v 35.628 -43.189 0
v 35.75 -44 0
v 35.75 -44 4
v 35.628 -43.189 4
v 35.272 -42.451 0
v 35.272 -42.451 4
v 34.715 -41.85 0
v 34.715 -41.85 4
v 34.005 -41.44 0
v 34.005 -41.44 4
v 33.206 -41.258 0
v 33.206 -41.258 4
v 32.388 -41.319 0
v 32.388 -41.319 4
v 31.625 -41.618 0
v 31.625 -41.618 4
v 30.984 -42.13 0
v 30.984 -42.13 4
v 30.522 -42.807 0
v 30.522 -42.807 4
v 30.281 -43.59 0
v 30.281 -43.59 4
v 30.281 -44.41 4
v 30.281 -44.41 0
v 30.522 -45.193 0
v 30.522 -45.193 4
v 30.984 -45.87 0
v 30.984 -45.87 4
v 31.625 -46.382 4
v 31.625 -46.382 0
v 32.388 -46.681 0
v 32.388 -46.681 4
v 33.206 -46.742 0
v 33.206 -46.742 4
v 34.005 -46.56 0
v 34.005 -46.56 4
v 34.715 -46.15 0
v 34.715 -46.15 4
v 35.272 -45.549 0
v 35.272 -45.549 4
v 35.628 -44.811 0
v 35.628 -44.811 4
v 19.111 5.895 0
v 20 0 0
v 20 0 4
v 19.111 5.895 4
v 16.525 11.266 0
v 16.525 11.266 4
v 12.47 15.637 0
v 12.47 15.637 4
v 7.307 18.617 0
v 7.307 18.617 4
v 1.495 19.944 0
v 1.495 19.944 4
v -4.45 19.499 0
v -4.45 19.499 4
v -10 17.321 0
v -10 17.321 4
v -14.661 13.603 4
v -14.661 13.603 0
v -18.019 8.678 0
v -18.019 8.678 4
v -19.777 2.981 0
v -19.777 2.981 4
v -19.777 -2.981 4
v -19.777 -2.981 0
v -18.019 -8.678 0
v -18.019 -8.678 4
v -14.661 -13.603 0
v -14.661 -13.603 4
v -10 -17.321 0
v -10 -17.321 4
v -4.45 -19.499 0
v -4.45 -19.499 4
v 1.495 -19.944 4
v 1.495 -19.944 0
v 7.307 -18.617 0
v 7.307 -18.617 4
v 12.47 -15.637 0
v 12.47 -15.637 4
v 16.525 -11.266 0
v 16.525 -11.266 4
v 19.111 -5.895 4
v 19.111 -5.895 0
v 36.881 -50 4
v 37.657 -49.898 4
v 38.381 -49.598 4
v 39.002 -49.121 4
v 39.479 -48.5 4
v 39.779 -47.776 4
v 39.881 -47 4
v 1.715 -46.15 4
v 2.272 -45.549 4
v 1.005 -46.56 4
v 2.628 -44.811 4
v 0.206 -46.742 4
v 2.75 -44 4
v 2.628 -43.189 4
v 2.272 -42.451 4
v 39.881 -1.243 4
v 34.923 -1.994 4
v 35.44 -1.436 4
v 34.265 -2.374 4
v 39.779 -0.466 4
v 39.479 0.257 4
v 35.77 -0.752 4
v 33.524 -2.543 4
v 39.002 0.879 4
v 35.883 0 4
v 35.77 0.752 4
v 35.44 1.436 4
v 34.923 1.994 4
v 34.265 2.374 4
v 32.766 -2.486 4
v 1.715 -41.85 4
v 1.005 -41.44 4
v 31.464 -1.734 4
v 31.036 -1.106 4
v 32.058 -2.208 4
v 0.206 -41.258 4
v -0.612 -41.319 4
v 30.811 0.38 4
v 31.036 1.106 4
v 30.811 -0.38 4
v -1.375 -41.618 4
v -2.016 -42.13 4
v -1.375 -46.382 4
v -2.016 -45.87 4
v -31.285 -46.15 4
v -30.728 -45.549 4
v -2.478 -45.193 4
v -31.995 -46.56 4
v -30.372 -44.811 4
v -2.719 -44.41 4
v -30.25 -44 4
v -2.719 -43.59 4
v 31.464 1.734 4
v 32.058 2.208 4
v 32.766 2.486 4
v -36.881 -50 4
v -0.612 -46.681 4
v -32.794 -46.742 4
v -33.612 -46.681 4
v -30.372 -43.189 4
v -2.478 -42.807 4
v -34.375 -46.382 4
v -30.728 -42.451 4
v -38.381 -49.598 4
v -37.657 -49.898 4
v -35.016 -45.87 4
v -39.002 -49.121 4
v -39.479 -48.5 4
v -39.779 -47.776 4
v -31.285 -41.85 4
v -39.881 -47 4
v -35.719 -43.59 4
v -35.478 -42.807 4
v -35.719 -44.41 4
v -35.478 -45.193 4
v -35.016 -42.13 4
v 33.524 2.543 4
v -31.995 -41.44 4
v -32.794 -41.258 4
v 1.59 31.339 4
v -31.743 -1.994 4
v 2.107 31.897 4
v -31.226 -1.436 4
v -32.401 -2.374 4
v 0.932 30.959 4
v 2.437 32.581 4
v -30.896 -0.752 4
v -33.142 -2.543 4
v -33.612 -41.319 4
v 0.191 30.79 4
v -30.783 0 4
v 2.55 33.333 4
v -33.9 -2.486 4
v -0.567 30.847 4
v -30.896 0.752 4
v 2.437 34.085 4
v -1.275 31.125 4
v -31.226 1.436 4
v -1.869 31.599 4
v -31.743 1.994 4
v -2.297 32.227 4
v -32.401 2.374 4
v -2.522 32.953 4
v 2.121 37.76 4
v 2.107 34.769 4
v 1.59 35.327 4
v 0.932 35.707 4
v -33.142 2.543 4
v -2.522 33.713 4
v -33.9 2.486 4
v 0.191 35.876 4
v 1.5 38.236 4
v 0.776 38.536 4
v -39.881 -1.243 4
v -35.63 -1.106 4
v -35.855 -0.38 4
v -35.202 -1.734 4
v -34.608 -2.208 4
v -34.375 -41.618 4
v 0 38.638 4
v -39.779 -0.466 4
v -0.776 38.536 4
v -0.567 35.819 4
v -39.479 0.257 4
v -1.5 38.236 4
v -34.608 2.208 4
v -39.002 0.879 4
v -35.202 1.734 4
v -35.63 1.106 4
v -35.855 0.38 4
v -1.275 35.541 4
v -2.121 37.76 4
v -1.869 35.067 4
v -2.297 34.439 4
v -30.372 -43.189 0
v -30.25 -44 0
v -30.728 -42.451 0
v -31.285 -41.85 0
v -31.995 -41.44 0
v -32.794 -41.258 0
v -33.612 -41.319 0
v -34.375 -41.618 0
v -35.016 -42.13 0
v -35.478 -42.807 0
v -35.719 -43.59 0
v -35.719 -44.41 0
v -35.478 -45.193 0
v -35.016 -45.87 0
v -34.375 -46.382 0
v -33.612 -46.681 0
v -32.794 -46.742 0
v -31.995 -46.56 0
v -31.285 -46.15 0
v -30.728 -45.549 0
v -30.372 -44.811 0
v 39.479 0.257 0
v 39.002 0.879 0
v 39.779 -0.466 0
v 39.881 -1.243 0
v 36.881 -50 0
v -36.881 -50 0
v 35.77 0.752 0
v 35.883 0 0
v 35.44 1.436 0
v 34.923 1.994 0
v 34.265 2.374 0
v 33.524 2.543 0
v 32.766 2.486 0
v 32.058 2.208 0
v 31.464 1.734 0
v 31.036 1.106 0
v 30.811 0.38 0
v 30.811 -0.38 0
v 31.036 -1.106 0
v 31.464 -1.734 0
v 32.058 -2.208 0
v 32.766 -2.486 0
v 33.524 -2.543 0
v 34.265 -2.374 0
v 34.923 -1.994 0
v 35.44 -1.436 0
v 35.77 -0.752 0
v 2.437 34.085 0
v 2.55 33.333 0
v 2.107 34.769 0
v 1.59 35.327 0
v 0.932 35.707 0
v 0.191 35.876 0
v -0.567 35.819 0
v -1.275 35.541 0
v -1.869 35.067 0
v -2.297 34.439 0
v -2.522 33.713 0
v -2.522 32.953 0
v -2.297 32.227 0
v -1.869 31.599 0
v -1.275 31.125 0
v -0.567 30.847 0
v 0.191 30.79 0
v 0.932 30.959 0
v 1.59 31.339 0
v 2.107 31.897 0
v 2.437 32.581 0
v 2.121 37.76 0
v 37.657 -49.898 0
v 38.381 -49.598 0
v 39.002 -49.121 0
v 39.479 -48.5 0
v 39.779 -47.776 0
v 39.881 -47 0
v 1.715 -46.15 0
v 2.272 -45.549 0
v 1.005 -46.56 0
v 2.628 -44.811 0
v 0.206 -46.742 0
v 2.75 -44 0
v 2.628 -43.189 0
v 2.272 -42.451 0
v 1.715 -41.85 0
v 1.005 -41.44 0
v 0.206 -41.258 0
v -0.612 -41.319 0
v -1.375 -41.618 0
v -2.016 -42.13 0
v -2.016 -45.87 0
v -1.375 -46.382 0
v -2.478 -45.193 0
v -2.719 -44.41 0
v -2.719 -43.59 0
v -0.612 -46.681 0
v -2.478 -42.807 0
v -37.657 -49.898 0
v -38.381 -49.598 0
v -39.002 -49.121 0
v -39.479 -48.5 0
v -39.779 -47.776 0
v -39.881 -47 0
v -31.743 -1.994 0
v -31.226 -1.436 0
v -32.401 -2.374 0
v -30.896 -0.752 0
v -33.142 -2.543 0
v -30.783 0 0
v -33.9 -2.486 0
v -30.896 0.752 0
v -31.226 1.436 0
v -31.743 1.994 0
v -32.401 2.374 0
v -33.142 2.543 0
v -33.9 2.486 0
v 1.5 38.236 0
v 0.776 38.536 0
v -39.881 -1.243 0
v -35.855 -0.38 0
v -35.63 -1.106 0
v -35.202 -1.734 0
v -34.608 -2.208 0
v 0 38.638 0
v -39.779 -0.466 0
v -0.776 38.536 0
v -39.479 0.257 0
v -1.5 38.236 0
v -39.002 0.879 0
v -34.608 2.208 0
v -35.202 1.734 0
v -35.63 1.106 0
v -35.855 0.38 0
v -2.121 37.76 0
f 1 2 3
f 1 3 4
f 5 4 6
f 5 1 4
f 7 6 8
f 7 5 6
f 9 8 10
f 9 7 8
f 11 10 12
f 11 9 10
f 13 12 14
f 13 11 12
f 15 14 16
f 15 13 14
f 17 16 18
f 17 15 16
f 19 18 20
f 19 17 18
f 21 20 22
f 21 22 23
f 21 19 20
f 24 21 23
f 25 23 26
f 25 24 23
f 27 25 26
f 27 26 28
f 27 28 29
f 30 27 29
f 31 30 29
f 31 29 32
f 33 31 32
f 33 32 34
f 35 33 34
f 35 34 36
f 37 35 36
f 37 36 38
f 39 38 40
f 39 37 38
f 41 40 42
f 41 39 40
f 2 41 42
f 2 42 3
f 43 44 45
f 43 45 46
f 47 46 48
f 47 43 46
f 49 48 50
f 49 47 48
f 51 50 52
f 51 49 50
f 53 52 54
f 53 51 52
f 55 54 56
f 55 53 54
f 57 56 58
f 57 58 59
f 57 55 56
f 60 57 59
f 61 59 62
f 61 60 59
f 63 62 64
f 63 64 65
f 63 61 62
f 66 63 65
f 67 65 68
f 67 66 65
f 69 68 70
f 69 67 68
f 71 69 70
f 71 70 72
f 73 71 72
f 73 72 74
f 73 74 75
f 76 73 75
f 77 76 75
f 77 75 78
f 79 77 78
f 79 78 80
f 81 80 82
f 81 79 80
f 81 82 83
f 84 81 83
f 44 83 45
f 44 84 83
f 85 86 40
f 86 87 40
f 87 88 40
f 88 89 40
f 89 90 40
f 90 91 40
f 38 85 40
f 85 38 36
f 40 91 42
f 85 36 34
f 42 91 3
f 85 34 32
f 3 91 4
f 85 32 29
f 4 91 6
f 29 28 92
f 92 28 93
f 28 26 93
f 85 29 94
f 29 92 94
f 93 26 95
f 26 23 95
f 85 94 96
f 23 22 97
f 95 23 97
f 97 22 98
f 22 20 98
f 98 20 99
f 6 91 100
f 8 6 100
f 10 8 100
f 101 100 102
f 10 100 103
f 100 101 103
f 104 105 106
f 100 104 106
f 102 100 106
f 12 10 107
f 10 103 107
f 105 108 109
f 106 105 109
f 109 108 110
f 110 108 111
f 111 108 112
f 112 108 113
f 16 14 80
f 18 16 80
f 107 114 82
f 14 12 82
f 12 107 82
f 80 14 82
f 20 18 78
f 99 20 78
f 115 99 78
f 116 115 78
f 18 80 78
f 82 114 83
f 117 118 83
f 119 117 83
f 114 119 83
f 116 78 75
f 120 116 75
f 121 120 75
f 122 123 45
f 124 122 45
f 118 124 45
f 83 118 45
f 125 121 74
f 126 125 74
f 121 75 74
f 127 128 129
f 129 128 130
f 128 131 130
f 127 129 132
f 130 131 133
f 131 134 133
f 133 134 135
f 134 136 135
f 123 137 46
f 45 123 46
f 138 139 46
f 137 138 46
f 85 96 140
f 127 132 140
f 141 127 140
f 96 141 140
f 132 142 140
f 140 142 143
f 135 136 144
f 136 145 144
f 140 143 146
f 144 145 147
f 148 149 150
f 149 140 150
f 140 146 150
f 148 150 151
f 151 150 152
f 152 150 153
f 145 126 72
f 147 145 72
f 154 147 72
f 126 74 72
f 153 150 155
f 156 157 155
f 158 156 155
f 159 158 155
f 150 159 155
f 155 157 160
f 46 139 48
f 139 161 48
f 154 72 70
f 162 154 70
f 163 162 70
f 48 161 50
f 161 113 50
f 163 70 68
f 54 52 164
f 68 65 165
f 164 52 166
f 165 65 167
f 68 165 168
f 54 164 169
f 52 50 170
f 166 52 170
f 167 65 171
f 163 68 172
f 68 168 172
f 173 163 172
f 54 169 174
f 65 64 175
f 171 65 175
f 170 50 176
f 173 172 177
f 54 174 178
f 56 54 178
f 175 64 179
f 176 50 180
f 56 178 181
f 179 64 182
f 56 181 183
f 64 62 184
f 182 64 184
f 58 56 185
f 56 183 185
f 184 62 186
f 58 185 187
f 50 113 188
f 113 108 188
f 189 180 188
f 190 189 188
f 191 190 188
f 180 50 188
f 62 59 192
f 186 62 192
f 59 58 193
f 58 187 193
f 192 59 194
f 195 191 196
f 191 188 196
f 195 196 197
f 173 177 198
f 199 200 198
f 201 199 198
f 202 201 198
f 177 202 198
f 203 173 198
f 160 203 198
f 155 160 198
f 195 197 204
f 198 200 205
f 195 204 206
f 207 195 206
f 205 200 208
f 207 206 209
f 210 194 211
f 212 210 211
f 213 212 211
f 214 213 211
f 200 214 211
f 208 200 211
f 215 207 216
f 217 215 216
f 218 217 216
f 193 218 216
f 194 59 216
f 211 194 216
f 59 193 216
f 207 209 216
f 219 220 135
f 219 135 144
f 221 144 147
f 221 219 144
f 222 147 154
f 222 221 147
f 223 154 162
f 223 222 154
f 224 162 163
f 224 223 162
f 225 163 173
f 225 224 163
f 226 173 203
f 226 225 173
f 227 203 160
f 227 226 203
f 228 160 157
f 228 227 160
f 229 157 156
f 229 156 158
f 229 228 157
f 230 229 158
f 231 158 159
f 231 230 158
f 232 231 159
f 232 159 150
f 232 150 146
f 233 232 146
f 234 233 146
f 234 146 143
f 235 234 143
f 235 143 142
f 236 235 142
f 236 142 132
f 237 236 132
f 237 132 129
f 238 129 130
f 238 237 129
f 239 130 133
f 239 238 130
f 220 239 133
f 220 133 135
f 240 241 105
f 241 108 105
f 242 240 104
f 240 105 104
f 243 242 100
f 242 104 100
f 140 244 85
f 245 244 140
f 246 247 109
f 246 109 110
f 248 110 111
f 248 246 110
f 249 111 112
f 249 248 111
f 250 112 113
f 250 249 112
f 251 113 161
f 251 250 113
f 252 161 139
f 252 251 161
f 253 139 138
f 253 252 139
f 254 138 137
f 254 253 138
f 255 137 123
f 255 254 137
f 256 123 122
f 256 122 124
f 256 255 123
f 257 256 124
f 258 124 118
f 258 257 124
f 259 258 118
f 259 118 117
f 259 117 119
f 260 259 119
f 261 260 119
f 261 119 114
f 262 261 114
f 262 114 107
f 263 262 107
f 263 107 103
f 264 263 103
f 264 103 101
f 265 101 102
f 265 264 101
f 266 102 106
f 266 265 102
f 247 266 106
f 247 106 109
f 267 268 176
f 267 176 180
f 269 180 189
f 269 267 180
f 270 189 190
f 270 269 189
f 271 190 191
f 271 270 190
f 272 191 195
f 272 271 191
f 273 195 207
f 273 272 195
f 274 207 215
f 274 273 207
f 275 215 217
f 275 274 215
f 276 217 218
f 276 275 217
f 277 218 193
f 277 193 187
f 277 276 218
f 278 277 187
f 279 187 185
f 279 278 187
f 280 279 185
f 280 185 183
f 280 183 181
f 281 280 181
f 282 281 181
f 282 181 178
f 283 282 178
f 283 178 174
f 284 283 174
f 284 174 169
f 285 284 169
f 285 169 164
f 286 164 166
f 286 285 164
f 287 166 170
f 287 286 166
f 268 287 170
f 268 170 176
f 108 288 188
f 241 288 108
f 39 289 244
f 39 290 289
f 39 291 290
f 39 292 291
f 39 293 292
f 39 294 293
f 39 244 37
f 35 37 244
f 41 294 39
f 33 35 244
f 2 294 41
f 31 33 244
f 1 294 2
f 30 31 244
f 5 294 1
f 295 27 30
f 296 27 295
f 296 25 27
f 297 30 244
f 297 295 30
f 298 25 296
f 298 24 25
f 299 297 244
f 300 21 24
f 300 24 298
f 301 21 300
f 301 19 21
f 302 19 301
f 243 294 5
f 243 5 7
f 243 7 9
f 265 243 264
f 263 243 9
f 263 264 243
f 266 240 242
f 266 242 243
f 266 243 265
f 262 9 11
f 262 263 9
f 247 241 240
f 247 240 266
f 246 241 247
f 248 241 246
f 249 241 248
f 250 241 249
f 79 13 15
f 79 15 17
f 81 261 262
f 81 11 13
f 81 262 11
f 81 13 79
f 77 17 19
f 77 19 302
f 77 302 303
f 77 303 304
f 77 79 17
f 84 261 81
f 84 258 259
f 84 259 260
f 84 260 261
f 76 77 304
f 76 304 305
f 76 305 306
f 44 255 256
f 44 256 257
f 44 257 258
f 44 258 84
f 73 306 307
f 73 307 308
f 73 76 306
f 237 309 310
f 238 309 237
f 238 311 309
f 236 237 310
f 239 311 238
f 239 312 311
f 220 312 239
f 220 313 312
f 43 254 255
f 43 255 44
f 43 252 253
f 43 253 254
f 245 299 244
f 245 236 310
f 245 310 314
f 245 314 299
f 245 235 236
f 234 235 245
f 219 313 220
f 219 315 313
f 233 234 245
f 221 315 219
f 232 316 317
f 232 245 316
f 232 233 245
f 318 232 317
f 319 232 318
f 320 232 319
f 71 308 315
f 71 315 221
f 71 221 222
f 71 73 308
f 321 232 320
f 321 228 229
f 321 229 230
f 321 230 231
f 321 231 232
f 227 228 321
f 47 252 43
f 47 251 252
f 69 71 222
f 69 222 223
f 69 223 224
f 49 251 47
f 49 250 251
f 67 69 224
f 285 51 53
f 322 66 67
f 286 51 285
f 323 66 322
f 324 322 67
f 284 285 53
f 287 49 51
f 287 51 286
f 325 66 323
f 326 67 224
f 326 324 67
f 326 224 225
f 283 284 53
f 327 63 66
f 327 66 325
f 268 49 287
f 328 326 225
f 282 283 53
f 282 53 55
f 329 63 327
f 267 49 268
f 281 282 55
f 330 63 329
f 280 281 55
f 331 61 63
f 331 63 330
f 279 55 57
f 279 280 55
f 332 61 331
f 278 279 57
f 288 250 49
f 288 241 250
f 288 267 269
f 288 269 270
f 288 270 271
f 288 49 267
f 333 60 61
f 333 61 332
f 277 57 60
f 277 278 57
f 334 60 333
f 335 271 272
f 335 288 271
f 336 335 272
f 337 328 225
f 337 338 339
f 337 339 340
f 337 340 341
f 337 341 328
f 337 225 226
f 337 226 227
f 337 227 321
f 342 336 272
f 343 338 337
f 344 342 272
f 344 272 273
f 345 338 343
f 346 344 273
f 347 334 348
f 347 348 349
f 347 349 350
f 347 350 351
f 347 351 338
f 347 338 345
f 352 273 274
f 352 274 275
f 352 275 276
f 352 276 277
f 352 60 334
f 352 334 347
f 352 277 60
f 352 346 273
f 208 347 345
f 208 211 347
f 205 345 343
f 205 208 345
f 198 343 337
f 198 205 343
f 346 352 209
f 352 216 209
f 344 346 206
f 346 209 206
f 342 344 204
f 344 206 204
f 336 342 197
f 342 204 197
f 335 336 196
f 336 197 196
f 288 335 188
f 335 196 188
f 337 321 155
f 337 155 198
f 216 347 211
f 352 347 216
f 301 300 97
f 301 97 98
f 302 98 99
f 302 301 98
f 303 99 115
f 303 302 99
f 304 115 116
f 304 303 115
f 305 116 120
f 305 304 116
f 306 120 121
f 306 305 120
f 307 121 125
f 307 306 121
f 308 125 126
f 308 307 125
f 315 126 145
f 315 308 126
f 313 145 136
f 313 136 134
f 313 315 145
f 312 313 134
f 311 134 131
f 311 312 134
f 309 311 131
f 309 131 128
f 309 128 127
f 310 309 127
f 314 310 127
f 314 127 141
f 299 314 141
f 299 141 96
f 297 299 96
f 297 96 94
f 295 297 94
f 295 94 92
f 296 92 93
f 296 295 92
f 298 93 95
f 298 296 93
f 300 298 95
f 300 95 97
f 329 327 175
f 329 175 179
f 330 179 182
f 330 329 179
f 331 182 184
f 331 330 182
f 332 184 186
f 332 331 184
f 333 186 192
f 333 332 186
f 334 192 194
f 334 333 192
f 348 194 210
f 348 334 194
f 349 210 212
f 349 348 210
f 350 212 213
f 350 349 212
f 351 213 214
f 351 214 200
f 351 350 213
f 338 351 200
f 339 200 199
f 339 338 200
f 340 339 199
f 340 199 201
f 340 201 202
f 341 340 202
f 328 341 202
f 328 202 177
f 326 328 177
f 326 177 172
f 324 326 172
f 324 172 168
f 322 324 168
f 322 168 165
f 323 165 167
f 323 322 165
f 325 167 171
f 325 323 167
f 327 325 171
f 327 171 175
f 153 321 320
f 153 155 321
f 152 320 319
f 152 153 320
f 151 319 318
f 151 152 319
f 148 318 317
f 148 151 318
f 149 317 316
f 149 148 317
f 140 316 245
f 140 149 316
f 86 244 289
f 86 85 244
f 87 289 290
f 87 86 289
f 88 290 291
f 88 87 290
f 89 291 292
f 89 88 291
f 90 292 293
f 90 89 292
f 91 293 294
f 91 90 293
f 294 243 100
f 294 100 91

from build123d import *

# Parameters (mm, degrees)
SKETCH_1_R      = 20
SKETCH_1_R_2    = 2.55
SKETCH_1_R_3    = 2.75
EXTRUDE_2_DEPTH = 4
FILLET_1_R      = 3


with BuildPart() as part:
    # Эскиз1 → Бобышка-Вытянуть2 (new body)
    with BuildSketch(Plane.XY):
        Polygon((-39.880822459, 0), (0, 39.880822459), (39.880822459, 0), (39.880822459, -50), (-39.880822459, -50), align=None)
        Circle(SKETCH_1_R, mode=Mode.SUBTRACT)
        with Locations((-33.333013665, 0)):
            Circle(SKETCH_1_R_2, mode=Mode.SUBTRACT)
        with Locations((0, 33.333013665)):
            Circle(SKETCH_1_R_2, mode=Mode.SUBTRACT)
        with Locations((33.333013665, 0)):
            Circle(SKETCH_1_R_2, mode=Mode.SUBTRACT)
        with Locations((-33, -44)):
            Circle(SKETCH_1_R_3, mode=Mode.SUBTRACT)
        with Locations((0, -44)):
            Circle(SKETCH_1_R_3, mode=Mode.SUBTRACT)
        with Locations((33, -44)):
            Circle(SKETCH_1_R_3, mode=Mode.SUBTRACT)
    extrude(amount=EXTRUDE_2_DEPTH)

    # Скругление1
    fillet_1_edges = [part.edges().sort_by_distance(p)[0] for p in [
        (-39.880822459, 0, 2),
        (0, 39.880822459, 2),
        (39.880822459, 0, 2),
        (39.880822459, -50, 2),
        (-39.880822459, -50, 2),
    ]]
    fillet(fillet_1_edges, radius=FILLET_1_R)


solid = part.part
